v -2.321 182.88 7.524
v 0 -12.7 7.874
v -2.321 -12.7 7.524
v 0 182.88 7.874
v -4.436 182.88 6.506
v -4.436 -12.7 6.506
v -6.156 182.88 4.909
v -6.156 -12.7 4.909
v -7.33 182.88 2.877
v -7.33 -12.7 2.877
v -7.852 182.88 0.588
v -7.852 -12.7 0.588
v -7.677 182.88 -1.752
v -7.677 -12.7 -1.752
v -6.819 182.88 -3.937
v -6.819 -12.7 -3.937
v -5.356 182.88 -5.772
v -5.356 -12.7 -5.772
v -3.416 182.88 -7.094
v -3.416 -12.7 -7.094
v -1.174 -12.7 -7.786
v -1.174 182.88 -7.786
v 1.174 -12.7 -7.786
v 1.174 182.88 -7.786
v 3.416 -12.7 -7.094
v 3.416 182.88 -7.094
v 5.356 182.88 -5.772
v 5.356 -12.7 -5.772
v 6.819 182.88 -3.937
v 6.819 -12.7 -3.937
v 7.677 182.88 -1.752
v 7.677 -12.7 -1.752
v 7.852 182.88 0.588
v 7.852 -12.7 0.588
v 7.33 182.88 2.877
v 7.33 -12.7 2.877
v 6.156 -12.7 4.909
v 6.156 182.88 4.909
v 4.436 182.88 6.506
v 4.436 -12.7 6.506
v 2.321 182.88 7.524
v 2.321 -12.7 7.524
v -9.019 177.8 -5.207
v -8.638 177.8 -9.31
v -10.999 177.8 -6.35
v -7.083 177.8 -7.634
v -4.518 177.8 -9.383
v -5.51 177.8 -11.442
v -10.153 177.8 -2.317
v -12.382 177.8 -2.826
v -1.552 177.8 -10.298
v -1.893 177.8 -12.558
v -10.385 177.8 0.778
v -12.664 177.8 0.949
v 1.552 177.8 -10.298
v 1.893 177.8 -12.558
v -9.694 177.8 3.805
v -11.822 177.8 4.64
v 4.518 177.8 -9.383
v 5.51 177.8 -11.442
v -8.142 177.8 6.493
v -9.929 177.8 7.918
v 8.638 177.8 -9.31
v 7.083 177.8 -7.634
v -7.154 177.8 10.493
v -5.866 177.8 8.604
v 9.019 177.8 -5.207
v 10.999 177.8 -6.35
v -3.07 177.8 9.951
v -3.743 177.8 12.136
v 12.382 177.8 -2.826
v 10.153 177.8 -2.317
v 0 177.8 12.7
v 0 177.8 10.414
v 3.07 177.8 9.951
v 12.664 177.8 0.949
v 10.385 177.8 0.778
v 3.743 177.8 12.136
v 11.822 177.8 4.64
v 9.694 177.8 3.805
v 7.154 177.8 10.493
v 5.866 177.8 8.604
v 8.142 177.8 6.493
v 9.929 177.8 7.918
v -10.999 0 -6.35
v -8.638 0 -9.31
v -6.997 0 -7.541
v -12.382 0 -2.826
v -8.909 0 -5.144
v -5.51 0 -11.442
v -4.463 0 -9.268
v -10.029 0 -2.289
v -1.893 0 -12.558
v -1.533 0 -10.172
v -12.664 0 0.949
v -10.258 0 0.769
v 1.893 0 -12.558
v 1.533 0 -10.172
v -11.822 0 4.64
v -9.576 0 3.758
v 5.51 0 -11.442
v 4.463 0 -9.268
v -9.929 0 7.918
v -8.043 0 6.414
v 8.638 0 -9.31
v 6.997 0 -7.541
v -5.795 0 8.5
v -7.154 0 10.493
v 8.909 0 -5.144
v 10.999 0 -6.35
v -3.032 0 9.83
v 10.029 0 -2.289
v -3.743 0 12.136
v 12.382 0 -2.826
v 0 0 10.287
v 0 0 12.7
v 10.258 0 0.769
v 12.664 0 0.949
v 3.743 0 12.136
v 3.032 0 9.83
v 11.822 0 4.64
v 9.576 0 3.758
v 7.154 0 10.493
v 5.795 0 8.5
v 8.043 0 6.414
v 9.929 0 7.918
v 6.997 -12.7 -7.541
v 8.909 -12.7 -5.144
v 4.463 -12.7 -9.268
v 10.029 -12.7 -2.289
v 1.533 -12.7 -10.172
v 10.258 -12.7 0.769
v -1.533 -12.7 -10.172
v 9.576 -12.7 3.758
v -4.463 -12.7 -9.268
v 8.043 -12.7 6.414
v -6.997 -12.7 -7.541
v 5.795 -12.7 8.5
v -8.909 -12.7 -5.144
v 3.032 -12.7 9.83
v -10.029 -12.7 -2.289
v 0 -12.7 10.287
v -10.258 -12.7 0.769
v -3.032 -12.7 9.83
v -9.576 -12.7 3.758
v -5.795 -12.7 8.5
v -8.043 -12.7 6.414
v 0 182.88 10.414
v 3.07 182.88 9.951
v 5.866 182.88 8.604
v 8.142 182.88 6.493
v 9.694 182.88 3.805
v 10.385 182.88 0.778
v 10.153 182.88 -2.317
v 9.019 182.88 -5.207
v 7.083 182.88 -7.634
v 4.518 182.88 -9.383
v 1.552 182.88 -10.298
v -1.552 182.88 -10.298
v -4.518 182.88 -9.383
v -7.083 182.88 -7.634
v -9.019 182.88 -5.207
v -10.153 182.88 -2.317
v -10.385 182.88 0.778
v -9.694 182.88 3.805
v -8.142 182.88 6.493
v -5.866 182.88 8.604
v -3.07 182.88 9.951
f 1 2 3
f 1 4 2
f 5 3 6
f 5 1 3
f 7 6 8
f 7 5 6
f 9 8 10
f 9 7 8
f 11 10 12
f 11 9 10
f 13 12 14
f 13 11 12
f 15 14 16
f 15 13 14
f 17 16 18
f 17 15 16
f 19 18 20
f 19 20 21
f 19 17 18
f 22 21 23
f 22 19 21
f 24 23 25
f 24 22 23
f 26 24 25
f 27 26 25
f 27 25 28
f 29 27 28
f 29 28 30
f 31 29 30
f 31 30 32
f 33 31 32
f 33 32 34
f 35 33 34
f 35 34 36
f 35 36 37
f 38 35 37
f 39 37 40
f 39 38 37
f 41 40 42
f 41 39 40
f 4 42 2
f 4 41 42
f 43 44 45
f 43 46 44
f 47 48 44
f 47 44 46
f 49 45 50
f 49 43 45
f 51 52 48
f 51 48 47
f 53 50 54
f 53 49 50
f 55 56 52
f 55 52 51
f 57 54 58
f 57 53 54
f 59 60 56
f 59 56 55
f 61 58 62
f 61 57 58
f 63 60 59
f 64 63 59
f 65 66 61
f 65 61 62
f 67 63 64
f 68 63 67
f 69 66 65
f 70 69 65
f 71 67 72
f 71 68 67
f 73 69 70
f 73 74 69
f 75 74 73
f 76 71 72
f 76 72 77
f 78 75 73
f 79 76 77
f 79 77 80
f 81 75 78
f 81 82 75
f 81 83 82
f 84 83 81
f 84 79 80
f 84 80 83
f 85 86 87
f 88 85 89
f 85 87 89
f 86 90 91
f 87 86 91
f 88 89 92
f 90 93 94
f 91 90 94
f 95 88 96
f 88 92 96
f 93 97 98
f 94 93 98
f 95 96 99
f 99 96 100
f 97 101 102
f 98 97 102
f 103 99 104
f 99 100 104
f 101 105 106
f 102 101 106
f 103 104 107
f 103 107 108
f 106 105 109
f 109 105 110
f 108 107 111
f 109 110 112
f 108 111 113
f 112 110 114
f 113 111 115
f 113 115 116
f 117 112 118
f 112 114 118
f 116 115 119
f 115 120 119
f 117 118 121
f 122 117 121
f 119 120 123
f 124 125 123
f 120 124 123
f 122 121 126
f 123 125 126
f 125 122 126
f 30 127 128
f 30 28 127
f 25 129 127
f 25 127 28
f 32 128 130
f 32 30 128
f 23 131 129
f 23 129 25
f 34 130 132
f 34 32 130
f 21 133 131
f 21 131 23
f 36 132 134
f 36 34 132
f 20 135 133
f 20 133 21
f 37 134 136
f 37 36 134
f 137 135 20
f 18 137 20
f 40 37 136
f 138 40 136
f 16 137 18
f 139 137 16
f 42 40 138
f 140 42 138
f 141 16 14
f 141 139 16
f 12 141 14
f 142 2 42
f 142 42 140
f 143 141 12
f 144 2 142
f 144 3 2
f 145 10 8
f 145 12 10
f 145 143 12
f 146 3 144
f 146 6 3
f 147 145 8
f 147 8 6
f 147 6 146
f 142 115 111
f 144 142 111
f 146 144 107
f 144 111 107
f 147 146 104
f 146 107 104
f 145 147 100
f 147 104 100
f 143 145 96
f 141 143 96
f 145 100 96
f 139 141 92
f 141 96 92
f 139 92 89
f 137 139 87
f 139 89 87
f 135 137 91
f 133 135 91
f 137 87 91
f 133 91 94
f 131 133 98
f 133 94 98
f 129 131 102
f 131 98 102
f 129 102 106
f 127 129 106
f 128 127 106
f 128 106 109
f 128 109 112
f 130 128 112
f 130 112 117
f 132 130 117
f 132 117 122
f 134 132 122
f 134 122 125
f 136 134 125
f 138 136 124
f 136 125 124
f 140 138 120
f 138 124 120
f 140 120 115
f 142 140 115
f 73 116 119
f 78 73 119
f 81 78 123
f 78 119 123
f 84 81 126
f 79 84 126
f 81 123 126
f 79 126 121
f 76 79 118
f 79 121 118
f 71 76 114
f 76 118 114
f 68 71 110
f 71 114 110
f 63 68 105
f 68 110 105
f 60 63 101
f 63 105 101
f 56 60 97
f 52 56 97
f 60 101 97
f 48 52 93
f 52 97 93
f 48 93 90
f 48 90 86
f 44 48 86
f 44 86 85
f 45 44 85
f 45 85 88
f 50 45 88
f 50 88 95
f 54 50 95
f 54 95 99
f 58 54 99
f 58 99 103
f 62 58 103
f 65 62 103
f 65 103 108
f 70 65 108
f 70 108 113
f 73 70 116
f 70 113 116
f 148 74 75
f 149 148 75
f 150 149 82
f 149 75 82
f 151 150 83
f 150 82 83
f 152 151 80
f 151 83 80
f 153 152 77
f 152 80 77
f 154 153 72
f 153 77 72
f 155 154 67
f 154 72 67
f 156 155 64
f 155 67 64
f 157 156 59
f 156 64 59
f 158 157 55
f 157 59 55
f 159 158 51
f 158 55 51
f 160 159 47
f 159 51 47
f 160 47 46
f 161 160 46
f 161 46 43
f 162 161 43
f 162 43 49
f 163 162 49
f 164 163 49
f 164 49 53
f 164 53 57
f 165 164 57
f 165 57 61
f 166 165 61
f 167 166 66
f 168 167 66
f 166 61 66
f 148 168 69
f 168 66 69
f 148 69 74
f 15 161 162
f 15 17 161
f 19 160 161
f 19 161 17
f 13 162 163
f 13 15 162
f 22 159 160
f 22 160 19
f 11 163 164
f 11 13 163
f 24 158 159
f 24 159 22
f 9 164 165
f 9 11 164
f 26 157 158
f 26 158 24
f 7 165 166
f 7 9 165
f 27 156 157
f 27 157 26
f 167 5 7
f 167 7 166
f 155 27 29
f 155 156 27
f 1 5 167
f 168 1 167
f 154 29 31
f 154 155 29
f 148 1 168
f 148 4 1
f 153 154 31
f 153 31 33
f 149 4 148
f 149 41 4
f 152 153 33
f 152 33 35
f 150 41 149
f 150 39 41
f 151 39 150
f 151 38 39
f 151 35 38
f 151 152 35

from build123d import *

# Parameters (mm, degrees)
SKETCH1_R           = 12.7
BOSS_EXTRUDE1_DEPTH = 177.8
SKETCH4_R           = 10.414
BOSS_EXTRUDE2_DEPTH = 5.08
SKETCH5_R           = 7.874
CUT_EXTRUDE1_DEPTH  = 184.759828036
SKETCH6_R           = 10.287
SKETCH6_R_2         = 7.874
BOSS_EXTRUDE3_DEPTH = 12.7


with BuildPart() as part:
    # Sketch1 → Boss-Extrude1 (new body)
    with BuildSketch(Plane(origin=(0, 0, 0), x_dir=(1, 0, 0), z_dir=(0, 1, 0))):
        with Locations(Location((0, 0, 0), (0, 0, 270))):
            Circle(SKETCH1_R)
    extrude(amount=BOSS_EXTRUDE1_DEPTH)

    # Sketch4 → Boss-Extrude2 (add)
    with BuildSketch(Plane(origin=(0, 177.8, 0), x_dir=(1, 0, 0), z_dir=(0, 1, 0))):
        with Locations(Location((0, 0, 0), (0, 0, 270))):
            Circle(SKETCH4_R)
    extrude(amount=BOSS_EXTRUDE2_DEPTH)

    # Sketch5 → Cut-Extrude1 (cut, through all)
    with BuildSketch(Plane(origin=(0, 182.88, 0), x_dir=(1, 0, 0), z_dir=(0, 1, 0))):
        with Locations(Location((0, 0, 0), (0, 0, 270))):
            Circle(SKETCH5_R)
    extrude(amount=-CUT_EXTRUDE1_DEPTH, mode=Mode.SUBTRACT)

    # Sketch6 → Boss-Extrude3 (add)
    with BuildSketch(Plane.XZ):
        with Locations(Location((0, 0, 0), (0, 0, 90))):
            Circle(SKETCH6_R)
        with Locations(Location((0, 0, 0), (0, 0, 90))):
            Circle(SKETCH6_R_2, mode=Mode.SUBTRACT)
    extrude(amount=BOSS_EXTRUDE3_DEPTH)


solid = part.part
